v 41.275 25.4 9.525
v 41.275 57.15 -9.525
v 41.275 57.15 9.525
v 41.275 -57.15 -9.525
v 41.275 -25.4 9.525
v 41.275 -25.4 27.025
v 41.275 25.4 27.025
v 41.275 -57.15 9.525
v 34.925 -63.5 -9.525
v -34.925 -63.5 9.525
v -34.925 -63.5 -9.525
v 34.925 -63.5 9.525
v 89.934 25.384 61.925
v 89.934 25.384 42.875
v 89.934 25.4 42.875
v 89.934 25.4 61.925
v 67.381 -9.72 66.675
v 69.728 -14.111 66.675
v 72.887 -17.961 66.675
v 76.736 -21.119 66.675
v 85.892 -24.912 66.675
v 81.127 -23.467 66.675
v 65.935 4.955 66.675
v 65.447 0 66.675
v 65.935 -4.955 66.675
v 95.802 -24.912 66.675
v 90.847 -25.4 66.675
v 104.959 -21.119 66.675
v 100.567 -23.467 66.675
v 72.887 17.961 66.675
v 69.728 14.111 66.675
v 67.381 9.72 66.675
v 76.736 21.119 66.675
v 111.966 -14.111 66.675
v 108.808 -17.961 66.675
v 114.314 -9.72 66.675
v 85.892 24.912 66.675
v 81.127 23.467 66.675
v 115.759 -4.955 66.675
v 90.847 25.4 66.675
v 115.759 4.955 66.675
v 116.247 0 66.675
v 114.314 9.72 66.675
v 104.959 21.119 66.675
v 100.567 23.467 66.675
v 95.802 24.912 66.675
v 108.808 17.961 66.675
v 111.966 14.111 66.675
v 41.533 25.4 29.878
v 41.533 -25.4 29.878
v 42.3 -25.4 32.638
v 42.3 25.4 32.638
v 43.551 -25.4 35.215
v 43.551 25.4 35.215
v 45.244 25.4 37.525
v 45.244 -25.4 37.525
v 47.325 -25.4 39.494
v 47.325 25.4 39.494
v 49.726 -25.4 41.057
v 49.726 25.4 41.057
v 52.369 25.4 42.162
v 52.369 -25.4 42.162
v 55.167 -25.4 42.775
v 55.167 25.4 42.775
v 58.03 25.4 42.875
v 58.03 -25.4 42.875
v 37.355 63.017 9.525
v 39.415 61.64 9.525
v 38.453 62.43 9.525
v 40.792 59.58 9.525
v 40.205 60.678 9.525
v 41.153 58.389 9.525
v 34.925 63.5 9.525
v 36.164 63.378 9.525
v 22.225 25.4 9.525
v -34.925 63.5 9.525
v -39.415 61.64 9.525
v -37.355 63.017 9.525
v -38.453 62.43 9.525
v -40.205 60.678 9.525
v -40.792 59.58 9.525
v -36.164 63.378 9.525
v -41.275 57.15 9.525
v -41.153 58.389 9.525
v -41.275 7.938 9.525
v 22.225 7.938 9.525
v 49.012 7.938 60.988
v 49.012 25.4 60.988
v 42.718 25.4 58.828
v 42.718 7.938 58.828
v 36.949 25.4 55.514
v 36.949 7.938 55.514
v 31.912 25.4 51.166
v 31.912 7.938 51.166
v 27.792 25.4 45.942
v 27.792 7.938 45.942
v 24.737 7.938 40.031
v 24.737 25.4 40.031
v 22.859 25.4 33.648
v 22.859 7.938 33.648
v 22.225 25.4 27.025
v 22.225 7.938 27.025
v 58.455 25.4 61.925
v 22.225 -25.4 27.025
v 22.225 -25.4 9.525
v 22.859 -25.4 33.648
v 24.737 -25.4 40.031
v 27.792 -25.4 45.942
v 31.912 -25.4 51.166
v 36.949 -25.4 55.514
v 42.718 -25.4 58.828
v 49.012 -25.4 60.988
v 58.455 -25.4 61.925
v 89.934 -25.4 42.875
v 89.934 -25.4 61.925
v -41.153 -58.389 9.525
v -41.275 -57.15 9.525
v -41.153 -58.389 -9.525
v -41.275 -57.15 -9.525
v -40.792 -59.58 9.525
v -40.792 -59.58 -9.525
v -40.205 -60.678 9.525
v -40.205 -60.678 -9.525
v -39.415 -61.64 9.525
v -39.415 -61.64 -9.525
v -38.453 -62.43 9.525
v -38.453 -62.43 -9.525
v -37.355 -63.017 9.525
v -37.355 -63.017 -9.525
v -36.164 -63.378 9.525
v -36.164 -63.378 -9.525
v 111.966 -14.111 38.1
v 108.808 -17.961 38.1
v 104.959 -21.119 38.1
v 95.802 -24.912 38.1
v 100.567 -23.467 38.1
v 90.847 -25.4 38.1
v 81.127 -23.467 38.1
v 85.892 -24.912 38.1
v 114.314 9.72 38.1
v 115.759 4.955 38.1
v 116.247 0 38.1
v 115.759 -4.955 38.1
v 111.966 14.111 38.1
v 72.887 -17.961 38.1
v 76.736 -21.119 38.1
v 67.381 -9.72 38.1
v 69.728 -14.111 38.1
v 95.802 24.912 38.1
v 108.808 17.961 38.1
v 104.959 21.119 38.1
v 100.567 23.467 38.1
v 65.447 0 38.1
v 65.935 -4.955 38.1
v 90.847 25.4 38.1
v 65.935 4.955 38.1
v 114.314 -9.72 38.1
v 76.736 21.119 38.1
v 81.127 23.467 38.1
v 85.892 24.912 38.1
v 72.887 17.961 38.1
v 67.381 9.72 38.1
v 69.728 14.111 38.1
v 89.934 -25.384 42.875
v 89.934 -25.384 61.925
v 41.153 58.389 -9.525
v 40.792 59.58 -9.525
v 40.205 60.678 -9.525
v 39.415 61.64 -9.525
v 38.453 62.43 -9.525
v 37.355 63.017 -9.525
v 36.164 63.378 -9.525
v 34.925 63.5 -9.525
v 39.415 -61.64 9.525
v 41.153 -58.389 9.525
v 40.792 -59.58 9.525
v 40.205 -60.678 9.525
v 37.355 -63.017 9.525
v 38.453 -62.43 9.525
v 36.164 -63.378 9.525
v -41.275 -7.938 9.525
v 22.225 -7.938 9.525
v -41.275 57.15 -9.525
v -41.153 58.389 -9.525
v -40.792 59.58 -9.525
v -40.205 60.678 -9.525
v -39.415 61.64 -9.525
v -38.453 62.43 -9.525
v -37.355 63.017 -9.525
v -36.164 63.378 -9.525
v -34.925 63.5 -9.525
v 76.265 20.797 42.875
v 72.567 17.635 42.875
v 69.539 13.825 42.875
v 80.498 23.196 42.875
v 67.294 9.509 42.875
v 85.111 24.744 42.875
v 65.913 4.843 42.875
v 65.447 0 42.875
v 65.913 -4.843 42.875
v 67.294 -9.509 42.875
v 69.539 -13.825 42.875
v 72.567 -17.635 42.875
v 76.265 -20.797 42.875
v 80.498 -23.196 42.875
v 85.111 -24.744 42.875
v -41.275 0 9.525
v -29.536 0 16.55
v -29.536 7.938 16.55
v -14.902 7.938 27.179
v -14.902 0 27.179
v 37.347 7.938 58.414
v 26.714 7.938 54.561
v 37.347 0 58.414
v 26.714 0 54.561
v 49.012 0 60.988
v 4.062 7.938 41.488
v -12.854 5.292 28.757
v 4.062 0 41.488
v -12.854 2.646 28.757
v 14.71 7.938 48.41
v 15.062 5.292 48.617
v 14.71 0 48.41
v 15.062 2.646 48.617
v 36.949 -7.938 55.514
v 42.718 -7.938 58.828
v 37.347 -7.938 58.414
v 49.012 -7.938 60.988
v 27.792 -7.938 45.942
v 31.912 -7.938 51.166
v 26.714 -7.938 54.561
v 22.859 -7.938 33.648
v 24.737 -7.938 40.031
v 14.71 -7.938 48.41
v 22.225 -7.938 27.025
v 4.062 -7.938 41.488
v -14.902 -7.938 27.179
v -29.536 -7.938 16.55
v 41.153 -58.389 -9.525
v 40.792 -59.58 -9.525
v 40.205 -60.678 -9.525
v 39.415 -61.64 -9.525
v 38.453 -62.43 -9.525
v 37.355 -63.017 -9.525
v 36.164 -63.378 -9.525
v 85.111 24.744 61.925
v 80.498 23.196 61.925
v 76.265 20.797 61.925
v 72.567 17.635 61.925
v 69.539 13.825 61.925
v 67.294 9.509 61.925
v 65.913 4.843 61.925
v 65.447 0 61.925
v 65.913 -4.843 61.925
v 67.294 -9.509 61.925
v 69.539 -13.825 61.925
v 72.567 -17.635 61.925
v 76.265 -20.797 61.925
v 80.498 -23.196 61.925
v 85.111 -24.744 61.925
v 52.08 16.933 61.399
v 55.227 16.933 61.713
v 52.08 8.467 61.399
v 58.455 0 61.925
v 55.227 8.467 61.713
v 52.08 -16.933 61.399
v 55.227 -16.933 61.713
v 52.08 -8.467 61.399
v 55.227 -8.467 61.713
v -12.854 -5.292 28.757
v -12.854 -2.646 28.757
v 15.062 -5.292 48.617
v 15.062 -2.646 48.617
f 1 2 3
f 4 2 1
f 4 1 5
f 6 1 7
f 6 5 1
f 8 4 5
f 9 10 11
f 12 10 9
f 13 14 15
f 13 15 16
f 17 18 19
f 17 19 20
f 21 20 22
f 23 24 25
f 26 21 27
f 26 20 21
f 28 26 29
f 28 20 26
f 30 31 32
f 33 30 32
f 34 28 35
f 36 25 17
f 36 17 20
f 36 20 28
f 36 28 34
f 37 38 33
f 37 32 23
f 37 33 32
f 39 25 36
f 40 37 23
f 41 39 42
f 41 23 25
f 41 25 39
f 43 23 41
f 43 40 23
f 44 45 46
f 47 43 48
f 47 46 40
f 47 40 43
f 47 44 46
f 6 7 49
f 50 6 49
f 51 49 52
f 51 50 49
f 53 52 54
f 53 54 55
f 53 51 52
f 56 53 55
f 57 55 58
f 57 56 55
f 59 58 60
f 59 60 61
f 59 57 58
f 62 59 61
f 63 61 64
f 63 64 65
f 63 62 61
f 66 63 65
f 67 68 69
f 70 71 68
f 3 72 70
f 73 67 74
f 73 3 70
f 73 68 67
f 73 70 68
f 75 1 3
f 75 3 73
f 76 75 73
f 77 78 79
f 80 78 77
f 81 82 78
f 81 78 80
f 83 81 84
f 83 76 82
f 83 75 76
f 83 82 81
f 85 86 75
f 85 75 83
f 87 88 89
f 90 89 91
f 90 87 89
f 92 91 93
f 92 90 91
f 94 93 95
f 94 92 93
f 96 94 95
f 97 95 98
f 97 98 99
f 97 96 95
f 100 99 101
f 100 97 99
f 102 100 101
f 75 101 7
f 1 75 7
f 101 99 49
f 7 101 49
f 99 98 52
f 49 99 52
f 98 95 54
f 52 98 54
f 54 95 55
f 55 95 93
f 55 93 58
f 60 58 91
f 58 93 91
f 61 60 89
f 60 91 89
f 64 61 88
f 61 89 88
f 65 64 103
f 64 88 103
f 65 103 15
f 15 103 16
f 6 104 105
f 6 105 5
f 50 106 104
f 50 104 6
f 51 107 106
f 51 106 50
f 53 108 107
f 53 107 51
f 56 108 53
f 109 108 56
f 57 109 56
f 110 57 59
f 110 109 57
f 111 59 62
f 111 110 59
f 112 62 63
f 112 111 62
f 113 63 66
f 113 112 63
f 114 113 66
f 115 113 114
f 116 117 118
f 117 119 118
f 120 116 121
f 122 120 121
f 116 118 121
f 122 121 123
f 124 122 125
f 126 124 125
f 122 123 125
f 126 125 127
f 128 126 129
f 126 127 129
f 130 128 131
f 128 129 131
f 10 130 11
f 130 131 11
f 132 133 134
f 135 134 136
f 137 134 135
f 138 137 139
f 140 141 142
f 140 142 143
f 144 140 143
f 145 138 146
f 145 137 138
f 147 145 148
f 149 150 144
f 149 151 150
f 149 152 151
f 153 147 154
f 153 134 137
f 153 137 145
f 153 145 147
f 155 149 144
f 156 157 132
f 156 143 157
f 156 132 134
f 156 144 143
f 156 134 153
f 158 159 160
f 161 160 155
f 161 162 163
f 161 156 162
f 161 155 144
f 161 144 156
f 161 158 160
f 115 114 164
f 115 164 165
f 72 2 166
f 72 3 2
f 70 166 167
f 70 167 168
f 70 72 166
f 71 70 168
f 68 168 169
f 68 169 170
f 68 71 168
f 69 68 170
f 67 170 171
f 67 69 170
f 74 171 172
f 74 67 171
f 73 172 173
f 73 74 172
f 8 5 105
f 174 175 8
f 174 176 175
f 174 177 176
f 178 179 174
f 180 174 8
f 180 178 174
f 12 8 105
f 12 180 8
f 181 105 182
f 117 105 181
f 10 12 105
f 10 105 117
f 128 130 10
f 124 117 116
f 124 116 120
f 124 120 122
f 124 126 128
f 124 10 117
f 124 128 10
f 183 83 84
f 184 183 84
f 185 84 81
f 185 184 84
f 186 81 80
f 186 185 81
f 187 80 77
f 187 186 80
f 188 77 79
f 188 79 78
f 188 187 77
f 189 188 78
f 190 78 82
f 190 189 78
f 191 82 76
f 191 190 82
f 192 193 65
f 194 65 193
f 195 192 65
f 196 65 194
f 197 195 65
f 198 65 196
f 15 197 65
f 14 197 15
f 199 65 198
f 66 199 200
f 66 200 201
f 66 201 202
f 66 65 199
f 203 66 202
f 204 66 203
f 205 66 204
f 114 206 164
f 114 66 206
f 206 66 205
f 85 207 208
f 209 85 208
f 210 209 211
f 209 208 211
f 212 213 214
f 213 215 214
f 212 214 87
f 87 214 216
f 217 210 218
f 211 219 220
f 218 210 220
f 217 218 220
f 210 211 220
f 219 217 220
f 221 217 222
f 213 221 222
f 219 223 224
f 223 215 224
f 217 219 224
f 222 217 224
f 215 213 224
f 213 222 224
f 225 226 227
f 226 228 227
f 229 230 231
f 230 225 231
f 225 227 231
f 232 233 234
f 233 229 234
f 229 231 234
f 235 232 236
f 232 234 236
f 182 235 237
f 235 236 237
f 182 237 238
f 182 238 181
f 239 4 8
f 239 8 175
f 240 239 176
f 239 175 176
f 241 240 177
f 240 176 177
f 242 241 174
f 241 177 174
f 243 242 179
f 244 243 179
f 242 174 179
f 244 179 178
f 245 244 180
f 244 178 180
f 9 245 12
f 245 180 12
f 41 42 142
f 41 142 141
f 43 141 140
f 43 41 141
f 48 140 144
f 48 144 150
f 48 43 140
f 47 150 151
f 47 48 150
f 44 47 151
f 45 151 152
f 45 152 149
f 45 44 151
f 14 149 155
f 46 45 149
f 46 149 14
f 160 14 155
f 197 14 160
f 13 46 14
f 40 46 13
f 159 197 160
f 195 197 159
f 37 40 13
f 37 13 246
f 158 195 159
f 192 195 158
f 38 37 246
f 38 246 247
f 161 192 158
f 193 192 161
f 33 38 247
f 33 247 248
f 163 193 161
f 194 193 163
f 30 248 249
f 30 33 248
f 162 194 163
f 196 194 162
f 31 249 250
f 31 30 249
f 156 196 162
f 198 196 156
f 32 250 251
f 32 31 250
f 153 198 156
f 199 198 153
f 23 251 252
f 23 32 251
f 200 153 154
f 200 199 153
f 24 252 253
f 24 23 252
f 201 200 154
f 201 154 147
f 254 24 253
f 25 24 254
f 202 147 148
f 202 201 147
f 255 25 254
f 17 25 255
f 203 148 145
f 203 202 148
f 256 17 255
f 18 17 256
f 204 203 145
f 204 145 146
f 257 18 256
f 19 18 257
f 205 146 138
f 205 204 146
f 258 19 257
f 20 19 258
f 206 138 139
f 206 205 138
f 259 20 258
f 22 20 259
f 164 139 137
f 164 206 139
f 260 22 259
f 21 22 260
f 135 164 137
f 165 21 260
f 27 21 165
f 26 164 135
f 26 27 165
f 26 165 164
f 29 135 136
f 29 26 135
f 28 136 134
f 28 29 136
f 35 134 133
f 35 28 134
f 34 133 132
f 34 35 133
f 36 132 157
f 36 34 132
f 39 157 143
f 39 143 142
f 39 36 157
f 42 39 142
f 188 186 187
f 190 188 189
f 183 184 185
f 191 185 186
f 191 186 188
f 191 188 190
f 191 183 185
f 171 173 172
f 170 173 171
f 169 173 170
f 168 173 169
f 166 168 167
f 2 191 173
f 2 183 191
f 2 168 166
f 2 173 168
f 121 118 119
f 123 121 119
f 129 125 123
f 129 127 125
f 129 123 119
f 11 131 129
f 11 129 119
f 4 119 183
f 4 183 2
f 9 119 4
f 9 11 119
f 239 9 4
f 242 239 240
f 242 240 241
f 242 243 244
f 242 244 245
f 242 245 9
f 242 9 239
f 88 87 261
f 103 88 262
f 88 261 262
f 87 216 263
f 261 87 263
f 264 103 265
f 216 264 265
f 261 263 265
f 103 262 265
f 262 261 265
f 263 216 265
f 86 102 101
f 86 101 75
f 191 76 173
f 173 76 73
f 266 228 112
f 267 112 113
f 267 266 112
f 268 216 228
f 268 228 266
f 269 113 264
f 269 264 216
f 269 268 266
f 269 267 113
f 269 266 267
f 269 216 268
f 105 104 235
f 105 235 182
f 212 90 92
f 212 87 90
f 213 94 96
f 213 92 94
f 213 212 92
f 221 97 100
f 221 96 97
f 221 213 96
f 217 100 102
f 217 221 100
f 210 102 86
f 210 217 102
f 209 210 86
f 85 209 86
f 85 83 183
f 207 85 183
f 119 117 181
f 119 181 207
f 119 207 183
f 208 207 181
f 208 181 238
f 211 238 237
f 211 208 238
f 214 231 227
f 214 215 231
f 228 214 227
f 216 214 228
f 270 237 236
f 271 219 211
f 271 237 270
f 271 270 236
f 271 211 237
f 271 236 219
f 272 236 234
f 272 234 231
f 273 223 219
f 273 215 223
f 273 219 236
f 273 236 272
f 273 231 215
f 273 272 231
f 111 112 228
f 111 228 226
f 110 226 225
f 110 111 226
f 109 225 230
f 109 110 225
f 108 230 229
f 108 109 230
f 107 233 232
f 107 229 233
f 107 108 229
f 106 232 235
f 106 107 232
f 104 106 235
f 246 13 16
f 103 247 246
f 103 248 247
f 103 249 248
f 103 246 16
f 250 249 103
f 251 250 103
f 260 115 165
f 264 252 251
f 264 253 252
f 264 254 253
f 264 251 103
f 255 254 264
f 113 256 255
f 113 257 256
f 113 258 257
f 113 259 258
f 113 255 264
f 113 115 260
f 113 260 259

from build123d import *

# Parameters (mm, degrees)
F1_DEPTH = 63.5
F0_W     = 24.486841
F0_H     = 19.05
F2_DEPTH = 25.4
F3_DEPTH = 7.9375
F5_R     = 6.35


with BuildPart() as f1:
    # F0 (on Front) → F1 (new body, symmetric)
    with BuildSketch(Plane.XZ):
        Polygon((22.225, 9.525), (-41.275, 9.525), (-41.275, -9.525), (41.275, -9.525), (41.275, 9.525), align=None)
    extrude(amount=F1_DEPTH, both=True)

    # F0 (on Front) → F2 (join, symmetric)
    with BuildSketch(Plane.XZ):
        with BuildLine():
            Line((22.225, 27.024607), (22.225, 9.525))
            Line((22.225, 9.525), (41.275, 9.525))
            Line((41.275, 9.525), (41.275, 27.024607))
            ThreePointArc((41.275, 27.024607), (46.240227, 38.556844), (58.029959, 42.8752))
            Line((58.029959, 42.8752), (65.447114, 42.8752))
            Line((65.447114, 42.8752), (65.447114, 61.9252))
            Line((65.447114, 61.9252), (58.455464, 61.9252))
            add(Edge.make_bspline(
                [(49.01163, 60.988154), (52.041988, 61.446427), (55.185381, 61.764423), (58.455464, 61.9252)],
                knots=[104.564463, 104.564463, 104.564463, 104.564463, 112.658539, 112.658539, 112.658539, 112.658539], degree=3))
            ThreePointArc((49.01163, 60.988154), (29.727489, 48.652402), (22.225, 27.024607))
        make_face()
        with Locations((77.690534, 52.4002)):
            Rectangle(F0_W, F0_H)
    extrude(amount=F2_DEPTH, both=True)

    # F0 (on Front) → F3 (join, symmetric)
    with BuildSketch(Plane.XZ):
        with BuildLine():
            add(Edge.make_bspline(
                [(-41.275, 9.525), (-10.419927, 25.736817), (9.863519, 55.0679), (49.01163, 60.988154)],
                knots=[0, 0, 0, 0, 104.564463, 104.564463, 104.564463, 104.564463], degree=3))
            Line((-41.275, 9.525), (22.225, 9.525))
            Line((22.225, 9.525), (22.225, 27.024607))
            ThreePointArc((22.225, 27.024607), (29.727489, 48.652402), (49.01163, 60.988154))
        make_face()
    extrude(amount=F3_DEPTH, both=True)

    # F0 (on Front) → F4 (revolve)
    with BuildSketch(Plane.XZ):
        Polygon((116.247114, 66.675), (90.847114, 66.675), (90.847114, 52.3875), (90.847114, 38.1), (116.247114, 38.1), align=None)
    revolve(axis=Axis((90.847114, 0, 52.3875), (0, 0, 1)))

    # F5
    f5_edges = [f1.edges().sort_by_distance(p)[0] for p in [
        (41.275, -63.5, 0),
        (-41.275, -63.5, 0),
        (41.275, 63.5, 0),
        (-41.275, 63.5, 0),
    ]]
    fillet(f5_edges, radius=F5_R)


solid = f1.part
